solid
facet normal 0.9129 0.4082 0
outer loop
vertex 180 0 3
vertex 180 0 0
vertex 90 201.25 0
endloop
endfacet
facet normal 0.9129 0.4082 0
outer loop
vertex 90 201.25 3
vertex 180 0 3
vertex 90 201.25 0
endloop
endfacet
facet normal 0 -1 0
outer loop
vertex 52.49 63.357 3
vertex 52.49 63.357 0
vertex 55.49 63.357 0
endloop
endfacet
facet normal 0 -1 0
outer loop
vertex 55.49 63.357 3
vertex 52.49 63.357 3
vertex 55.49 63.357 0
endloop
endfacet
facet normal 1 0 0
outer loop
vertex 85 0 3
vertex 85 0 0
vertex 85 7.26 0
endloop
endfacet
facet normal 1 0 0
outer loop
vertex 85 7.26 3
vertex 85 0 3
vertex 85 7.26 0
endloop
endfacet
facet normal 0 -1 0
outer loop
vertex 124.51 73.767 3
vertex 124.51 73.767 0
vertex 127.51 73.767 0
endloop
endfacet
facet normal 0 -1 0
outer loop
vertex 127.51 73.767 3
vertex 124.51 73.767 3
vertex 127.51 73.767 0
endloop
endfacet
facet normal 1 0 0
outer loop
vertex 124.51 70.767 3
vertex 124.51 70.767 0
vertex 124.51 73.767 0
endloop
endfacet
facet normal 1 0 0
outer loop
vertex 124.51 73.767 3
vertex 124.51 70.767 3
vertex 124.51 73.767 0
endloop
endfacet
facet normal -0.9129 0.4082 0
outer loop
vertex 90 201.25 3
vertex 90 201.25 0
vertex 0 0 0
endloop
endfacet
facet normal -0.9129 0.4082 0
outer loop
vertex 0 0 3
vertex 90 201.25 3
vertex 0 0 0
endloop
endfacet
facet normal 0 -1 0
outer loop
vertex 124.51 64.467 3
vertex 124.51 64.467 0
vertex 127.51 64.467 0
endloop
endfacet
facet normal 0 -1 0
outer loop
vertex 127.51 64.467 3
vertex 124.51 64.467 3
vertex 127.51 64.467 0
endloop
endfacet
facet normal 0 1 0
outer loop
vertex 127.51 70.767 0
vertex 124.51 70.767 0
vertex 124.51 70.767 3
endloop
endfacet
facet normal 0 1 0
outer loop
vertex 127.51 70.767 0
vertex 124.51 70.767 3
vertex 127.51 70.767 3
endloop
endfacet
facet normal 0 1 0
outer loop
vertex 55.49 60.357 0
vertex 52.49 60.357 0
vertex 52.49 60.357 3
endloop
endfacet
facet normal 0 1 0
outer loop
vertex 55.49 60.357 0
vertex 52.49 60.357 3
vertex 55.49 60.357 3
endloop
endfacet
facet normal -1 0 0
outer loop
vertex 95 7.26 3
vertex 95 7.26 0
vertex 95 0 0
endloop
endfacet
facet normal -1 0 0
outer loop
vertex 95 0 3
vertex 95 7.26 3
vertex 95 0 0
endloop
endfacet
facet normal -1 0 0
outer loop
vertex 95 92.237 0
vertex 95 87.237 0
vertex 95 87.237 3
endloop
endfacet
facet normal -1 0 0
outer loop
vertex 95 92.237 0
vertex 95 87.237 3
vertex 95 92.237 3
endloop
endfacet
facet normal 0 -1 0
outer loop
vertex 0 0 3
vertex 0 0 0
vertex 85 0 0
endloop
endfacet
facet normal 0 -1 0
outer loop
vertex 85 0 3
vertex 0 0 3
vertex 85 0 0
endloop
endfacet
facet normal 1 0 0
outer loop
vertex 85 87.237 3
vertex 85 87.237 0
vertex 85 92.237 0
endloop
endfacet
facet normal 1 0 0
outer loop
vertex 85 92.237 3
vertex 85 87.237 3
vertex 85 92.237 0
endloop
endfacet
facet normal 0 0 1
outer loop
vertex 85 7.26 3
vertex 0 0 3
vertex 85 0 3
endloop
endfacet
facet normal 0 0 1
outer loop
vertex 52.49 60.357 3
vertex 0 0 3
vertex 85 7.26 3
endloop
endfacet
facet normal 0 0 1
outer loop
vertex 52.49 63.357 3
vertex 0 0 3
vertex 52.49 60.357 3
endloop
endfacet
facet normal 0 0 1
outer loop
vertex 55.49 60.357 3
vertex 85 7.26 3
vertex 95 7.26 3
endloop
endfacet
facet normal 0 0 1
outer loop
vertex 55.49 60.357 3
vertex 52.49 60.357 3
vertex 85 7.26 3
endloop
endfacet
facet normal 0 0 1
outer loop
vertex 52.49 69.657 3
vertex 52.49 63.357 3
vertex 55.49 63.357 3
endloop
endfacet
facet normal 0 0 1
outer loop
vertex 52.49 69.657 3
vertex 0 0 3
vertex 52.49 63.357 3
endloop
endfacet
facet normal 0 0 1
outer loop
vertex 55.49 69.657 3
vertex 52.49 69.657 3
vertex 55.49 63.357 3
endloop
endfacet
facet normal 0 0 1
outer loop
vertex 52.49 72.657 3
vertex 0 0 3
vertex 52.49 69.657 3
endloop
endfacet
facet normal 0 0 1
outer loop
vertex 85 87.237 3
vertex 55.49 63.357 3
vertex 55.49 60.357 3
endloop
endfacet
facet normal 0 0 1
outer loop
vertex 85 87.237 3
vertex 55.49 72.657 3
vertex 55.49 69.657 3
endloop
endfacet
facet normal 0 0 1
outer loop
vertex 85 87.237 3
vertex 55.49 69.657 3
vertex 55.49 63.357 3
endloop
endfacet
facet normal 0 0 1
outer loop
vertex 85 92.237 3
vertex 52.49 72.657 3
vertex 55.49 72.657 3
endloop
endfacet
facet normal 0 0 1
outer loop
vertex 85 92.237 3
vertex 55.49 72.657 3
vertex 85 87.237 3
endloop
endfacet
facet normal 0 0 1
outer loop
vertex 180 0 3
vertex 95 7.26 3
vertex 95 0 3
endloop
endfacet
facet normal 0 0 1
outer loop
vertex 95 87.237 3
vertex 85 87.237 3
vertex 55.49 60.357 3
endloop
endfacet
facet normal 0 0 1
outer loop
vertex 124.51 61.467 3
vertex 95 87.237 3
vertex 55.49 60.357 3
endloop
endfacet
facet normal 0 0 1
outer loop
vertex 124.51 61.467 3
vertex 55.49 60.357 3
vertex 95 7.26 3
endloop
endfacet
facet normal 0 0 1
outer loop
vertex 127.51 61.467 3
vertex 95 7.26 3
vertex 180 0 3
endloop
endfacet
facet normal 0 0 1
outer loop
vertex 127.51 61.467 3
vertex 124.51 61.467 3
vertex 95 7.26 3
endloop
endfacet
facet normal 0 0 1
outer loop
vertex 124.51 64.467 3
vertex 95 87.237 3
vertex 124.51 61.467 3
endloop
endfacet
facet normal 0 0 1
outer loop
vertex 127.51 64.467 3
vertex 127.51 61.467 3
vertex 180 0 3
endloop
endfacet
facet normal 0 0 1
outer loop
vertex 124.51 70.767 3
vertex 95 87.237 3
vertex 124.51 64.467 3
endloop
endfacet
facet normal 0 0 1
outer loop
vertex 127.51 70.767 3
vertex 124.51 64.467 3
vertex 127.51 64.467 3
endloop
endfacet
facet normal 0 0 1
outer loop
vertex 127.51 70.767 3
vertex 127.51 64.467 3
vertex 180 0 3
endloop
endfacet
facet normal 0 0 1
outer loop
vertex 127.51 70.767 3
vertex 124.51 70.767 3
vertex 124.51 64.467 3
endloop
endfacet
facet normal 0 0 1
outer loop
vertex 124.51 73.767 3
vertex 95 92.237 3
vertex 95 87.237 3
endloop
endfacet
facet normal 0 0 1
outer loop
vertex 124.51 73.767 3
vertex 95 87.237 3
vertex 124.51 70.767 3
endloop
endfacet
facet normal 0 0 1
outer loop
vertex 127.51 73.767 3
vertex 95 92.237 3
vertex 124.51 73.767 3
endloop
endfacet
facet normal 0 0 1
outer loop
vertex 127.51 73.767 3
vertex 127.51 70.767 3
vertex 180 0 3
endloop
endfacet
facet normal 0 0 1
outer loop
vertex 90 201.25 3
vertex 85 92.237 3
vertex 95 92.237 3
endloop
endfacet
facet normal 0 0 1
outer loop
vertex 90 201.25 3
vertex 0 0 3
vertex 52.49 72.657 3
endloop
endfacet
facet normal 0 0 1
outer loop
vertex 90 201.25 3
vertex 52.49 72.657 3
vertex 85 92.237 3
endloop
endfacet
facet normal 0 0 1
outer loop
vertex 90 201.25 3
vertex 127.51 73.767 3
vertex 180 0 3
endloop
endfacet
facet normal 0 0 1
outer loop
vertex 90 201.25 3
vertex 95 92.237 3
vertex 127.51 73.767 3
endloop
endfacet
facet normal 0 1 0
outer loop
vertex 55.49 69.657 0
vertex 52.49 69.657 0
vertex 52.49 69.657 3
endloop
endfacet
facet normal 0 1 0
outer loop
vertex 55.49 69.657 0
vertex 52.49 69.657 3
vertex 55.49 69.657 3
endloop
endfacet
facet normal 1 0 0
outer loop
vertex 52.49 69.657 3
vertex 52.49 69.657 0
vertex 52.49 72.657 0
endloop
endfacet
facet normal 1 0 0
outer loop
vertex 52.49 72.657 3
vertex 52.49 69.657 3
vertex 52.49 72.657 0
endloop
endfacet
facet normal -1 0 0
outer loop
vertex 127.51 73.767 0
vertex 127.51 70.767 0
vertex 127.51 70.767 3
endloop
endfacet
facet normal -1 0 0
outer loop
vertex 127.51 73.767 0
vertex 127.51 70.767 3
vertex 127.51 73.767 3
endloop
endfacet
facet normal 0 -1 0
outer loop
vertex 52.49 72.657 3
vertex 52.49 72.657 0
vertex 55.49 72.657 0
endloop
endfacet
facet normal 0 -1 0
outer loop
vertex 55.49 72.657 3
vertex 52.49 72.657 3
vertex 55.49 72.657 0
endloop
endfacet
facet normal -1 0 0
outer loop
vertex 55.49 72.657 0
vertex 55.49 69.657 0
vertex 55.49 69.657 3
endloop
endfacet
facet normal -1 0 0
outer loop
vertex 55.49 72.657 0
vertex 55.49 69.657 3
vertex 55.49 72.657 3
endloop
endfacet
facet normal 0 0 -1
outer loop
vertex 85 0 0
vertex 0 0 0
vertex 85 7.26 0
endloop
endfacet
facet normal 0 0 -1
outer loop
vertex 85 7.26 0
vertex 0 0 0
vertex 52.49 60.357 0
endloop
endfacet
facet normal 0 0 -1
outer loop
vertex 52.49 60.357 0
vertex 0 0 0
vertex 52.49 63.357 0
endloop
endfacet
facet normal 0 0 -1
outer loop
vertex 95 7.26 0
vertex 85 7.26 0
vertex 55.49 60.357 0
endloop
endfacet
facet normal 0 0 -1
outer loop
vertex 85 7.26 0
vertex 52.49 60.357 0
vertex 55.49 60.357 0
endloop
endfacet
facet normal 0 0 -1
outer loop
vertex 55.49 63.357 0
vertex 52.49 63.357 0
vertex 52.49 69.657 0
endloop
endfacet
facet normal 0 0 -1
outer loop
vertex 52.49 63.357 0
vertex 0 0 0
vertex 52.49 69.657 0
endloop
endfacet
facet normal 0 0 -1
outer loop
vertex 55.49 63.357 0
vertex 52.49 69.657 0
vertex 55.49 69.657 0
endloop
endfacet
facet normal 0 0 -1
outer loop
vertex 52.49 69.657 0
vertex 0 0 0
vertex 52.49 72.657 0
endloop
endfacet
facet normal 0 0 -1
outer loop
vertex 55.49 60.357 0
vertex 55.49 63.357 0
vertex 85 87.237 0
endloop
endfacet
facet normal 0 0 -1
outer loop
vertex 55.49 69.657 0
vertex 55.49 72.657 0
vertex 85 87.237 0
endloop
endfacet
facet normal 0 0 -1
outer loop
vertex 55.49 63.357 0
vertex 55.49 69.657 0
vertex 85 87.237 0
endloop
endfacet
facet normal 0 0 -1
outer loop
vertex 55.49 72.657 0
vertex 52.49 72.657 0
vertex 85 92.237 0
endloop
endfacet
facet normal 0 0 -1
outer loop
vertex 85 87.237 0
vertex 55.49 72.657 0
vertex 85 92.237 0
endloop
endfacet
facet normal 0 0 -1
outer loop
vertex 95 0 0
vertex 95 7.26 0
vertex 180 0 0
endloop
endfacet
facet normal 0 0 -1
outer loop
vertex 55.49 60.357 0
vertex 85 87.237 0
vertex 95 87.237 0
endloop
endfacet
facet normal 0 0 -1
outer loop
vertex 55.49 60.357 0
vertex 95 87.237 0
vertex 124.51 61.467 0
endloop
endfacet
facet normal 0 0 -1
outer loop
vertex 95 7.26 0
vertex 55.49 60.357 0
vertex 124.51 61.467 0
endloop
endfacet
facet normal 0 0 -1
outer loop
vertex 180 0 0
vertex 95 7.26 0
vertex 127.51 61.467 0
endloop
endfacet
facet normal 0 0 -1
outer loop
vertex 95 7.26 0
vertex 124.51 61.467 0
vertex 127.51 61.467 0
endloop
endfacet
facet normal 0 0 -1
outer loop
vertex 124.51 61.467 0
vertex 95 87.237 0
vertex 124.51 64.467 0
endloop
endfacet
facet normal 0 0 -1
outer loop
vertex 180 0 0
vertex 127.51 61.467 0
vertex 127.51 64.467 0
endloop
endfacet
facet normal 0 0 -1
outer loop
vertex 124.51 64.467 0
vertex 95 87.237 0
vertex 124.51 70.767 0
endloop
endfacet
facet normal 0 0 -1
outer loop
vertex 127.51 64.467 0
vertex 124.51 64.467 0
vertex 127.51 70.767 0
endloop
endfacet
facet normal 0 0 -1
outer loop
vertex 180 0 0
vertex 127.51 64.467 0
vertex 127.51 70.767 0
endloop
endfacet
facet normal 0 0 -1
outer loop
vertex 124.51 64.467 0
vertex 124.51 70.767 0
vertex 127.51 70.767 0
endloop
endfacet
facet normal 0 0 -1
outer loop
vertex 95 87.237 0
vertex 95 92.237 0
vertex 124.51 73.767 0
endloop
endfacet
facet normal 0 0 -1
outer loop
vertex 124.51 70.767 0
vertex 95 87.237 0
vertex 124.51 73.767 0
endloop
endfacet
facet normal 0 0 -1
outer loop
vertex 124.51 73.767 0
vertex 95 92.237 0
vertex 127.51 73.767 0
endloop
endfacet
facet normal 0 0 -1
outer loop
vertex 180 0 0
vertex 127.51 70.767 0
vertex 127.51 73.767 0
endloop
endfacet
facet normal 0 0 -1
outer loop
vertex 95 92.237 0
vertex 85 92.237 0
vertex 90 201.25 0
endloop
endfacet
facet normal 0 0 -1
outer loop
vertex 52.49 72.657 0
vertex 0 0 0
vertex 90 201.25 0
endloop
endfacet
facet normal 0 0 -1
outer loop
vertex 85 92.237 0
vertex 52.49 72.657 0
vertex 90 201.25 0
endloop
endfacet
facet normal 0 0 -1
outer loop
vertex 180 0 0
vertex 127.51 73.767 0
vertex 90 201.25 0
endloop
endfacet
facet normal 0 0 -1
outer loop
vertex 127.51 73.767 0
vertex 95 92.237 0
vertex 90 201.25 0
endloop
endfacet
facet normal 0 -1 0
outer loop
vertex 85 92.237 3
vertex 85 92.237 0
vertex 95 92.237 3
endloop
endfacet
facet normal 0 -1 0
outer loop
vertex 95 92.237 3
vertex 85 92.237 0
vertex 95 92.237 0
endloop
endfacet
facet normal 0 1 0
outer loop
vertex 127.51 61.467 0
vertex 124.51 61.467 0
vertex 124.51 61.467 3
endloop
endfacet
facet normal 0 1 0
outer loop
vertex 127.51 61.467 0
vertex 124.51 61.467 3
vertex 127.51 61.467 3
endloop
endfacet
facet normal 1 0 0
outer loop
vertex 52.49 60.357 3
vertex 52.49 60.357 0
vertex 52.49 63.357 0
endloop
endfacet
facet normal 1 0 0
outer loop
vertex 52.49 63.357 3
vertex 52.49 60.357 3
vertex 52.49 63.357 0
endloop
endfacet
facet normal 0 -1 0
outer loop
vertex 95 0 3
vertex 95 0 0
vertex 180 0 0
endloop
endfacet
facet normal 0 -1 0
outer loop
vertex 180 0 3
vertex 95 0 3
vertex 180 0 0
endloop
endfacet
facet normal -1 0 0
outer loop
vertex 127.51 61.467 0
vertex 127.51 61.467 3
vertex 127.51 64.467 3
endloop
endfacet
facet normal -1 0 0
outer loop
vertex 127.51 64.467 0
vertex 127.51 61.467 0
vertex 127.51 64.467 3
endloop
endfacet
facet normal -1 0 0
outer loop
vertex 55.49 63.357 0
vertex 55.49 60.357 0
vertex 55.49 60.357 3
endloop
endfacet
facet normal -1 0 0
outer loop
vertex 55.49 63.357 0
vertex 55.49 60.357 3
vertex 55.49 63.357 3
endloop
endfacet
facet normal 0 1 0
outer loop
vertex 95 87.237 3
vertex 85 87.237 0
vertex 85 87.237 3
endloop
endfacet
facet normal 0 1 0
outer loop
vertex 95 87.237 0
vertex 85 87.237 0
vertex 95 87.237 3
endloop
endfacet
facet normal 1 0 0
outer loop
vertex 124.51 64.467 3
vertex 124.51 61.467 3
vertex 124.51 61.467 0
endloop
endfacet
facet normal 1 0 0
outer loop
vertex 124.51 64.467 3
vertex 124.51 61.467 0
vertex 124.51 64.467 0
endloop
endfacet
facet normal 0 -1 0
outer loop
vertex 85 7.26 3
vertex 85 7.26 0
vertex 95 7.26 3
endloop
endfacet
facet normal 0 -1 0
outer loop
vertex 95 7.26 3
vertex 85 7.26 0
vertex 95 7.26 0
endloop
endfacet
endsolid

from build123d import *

# Parameters (mm, degrees)
SKETCH1_W           = 3
SKETCH1_H           = 3
SKETCH1_W_2         = 10
SKETCH1_H_2         = 5
BOSS_EXTRUDE4_DEPTH = 3


with BuildPart() as part:
    # Sketch1 → Boss-Extrude4 (new body)
    with BuildSketch(Plane.XY):
        Polygon((90, 201.25), (0, 0), (85, 0), (85, 7.26), (95, 7.26), (95, 0), (180, 0), align=None)
        with Locations((53.99, 61.857444444)):
            Rectangle(SKETCH1_W, SKETCH1_H, mode=Mode.SUBTRACT)
        with Locations((53.99, 71.157444444)):
            Rectangle(SKETCH1_W, SKETCH1_H, mode=Mode.SUBTRACT)
        with Locations((90, 89.737444444)):
            Rectangle(SKETCH1_W_2, SKETCH1_H_2, mode=Mode.SUBTRACT)
        with Locations((126.01, 62.967444444)):
            Rectangle(SKETCH1_W, SKETCH1_H, mode=Mode.SUBTRACT)
        with Locations((126.01, 72.267444444)):
            Rectangle(SKETCH1_W, SKETCH1_H, mode=Mode.SUBTRACT)
    extrude(amount=BOSS_EXTRUDE4_DEPTH)


solid = part.part
